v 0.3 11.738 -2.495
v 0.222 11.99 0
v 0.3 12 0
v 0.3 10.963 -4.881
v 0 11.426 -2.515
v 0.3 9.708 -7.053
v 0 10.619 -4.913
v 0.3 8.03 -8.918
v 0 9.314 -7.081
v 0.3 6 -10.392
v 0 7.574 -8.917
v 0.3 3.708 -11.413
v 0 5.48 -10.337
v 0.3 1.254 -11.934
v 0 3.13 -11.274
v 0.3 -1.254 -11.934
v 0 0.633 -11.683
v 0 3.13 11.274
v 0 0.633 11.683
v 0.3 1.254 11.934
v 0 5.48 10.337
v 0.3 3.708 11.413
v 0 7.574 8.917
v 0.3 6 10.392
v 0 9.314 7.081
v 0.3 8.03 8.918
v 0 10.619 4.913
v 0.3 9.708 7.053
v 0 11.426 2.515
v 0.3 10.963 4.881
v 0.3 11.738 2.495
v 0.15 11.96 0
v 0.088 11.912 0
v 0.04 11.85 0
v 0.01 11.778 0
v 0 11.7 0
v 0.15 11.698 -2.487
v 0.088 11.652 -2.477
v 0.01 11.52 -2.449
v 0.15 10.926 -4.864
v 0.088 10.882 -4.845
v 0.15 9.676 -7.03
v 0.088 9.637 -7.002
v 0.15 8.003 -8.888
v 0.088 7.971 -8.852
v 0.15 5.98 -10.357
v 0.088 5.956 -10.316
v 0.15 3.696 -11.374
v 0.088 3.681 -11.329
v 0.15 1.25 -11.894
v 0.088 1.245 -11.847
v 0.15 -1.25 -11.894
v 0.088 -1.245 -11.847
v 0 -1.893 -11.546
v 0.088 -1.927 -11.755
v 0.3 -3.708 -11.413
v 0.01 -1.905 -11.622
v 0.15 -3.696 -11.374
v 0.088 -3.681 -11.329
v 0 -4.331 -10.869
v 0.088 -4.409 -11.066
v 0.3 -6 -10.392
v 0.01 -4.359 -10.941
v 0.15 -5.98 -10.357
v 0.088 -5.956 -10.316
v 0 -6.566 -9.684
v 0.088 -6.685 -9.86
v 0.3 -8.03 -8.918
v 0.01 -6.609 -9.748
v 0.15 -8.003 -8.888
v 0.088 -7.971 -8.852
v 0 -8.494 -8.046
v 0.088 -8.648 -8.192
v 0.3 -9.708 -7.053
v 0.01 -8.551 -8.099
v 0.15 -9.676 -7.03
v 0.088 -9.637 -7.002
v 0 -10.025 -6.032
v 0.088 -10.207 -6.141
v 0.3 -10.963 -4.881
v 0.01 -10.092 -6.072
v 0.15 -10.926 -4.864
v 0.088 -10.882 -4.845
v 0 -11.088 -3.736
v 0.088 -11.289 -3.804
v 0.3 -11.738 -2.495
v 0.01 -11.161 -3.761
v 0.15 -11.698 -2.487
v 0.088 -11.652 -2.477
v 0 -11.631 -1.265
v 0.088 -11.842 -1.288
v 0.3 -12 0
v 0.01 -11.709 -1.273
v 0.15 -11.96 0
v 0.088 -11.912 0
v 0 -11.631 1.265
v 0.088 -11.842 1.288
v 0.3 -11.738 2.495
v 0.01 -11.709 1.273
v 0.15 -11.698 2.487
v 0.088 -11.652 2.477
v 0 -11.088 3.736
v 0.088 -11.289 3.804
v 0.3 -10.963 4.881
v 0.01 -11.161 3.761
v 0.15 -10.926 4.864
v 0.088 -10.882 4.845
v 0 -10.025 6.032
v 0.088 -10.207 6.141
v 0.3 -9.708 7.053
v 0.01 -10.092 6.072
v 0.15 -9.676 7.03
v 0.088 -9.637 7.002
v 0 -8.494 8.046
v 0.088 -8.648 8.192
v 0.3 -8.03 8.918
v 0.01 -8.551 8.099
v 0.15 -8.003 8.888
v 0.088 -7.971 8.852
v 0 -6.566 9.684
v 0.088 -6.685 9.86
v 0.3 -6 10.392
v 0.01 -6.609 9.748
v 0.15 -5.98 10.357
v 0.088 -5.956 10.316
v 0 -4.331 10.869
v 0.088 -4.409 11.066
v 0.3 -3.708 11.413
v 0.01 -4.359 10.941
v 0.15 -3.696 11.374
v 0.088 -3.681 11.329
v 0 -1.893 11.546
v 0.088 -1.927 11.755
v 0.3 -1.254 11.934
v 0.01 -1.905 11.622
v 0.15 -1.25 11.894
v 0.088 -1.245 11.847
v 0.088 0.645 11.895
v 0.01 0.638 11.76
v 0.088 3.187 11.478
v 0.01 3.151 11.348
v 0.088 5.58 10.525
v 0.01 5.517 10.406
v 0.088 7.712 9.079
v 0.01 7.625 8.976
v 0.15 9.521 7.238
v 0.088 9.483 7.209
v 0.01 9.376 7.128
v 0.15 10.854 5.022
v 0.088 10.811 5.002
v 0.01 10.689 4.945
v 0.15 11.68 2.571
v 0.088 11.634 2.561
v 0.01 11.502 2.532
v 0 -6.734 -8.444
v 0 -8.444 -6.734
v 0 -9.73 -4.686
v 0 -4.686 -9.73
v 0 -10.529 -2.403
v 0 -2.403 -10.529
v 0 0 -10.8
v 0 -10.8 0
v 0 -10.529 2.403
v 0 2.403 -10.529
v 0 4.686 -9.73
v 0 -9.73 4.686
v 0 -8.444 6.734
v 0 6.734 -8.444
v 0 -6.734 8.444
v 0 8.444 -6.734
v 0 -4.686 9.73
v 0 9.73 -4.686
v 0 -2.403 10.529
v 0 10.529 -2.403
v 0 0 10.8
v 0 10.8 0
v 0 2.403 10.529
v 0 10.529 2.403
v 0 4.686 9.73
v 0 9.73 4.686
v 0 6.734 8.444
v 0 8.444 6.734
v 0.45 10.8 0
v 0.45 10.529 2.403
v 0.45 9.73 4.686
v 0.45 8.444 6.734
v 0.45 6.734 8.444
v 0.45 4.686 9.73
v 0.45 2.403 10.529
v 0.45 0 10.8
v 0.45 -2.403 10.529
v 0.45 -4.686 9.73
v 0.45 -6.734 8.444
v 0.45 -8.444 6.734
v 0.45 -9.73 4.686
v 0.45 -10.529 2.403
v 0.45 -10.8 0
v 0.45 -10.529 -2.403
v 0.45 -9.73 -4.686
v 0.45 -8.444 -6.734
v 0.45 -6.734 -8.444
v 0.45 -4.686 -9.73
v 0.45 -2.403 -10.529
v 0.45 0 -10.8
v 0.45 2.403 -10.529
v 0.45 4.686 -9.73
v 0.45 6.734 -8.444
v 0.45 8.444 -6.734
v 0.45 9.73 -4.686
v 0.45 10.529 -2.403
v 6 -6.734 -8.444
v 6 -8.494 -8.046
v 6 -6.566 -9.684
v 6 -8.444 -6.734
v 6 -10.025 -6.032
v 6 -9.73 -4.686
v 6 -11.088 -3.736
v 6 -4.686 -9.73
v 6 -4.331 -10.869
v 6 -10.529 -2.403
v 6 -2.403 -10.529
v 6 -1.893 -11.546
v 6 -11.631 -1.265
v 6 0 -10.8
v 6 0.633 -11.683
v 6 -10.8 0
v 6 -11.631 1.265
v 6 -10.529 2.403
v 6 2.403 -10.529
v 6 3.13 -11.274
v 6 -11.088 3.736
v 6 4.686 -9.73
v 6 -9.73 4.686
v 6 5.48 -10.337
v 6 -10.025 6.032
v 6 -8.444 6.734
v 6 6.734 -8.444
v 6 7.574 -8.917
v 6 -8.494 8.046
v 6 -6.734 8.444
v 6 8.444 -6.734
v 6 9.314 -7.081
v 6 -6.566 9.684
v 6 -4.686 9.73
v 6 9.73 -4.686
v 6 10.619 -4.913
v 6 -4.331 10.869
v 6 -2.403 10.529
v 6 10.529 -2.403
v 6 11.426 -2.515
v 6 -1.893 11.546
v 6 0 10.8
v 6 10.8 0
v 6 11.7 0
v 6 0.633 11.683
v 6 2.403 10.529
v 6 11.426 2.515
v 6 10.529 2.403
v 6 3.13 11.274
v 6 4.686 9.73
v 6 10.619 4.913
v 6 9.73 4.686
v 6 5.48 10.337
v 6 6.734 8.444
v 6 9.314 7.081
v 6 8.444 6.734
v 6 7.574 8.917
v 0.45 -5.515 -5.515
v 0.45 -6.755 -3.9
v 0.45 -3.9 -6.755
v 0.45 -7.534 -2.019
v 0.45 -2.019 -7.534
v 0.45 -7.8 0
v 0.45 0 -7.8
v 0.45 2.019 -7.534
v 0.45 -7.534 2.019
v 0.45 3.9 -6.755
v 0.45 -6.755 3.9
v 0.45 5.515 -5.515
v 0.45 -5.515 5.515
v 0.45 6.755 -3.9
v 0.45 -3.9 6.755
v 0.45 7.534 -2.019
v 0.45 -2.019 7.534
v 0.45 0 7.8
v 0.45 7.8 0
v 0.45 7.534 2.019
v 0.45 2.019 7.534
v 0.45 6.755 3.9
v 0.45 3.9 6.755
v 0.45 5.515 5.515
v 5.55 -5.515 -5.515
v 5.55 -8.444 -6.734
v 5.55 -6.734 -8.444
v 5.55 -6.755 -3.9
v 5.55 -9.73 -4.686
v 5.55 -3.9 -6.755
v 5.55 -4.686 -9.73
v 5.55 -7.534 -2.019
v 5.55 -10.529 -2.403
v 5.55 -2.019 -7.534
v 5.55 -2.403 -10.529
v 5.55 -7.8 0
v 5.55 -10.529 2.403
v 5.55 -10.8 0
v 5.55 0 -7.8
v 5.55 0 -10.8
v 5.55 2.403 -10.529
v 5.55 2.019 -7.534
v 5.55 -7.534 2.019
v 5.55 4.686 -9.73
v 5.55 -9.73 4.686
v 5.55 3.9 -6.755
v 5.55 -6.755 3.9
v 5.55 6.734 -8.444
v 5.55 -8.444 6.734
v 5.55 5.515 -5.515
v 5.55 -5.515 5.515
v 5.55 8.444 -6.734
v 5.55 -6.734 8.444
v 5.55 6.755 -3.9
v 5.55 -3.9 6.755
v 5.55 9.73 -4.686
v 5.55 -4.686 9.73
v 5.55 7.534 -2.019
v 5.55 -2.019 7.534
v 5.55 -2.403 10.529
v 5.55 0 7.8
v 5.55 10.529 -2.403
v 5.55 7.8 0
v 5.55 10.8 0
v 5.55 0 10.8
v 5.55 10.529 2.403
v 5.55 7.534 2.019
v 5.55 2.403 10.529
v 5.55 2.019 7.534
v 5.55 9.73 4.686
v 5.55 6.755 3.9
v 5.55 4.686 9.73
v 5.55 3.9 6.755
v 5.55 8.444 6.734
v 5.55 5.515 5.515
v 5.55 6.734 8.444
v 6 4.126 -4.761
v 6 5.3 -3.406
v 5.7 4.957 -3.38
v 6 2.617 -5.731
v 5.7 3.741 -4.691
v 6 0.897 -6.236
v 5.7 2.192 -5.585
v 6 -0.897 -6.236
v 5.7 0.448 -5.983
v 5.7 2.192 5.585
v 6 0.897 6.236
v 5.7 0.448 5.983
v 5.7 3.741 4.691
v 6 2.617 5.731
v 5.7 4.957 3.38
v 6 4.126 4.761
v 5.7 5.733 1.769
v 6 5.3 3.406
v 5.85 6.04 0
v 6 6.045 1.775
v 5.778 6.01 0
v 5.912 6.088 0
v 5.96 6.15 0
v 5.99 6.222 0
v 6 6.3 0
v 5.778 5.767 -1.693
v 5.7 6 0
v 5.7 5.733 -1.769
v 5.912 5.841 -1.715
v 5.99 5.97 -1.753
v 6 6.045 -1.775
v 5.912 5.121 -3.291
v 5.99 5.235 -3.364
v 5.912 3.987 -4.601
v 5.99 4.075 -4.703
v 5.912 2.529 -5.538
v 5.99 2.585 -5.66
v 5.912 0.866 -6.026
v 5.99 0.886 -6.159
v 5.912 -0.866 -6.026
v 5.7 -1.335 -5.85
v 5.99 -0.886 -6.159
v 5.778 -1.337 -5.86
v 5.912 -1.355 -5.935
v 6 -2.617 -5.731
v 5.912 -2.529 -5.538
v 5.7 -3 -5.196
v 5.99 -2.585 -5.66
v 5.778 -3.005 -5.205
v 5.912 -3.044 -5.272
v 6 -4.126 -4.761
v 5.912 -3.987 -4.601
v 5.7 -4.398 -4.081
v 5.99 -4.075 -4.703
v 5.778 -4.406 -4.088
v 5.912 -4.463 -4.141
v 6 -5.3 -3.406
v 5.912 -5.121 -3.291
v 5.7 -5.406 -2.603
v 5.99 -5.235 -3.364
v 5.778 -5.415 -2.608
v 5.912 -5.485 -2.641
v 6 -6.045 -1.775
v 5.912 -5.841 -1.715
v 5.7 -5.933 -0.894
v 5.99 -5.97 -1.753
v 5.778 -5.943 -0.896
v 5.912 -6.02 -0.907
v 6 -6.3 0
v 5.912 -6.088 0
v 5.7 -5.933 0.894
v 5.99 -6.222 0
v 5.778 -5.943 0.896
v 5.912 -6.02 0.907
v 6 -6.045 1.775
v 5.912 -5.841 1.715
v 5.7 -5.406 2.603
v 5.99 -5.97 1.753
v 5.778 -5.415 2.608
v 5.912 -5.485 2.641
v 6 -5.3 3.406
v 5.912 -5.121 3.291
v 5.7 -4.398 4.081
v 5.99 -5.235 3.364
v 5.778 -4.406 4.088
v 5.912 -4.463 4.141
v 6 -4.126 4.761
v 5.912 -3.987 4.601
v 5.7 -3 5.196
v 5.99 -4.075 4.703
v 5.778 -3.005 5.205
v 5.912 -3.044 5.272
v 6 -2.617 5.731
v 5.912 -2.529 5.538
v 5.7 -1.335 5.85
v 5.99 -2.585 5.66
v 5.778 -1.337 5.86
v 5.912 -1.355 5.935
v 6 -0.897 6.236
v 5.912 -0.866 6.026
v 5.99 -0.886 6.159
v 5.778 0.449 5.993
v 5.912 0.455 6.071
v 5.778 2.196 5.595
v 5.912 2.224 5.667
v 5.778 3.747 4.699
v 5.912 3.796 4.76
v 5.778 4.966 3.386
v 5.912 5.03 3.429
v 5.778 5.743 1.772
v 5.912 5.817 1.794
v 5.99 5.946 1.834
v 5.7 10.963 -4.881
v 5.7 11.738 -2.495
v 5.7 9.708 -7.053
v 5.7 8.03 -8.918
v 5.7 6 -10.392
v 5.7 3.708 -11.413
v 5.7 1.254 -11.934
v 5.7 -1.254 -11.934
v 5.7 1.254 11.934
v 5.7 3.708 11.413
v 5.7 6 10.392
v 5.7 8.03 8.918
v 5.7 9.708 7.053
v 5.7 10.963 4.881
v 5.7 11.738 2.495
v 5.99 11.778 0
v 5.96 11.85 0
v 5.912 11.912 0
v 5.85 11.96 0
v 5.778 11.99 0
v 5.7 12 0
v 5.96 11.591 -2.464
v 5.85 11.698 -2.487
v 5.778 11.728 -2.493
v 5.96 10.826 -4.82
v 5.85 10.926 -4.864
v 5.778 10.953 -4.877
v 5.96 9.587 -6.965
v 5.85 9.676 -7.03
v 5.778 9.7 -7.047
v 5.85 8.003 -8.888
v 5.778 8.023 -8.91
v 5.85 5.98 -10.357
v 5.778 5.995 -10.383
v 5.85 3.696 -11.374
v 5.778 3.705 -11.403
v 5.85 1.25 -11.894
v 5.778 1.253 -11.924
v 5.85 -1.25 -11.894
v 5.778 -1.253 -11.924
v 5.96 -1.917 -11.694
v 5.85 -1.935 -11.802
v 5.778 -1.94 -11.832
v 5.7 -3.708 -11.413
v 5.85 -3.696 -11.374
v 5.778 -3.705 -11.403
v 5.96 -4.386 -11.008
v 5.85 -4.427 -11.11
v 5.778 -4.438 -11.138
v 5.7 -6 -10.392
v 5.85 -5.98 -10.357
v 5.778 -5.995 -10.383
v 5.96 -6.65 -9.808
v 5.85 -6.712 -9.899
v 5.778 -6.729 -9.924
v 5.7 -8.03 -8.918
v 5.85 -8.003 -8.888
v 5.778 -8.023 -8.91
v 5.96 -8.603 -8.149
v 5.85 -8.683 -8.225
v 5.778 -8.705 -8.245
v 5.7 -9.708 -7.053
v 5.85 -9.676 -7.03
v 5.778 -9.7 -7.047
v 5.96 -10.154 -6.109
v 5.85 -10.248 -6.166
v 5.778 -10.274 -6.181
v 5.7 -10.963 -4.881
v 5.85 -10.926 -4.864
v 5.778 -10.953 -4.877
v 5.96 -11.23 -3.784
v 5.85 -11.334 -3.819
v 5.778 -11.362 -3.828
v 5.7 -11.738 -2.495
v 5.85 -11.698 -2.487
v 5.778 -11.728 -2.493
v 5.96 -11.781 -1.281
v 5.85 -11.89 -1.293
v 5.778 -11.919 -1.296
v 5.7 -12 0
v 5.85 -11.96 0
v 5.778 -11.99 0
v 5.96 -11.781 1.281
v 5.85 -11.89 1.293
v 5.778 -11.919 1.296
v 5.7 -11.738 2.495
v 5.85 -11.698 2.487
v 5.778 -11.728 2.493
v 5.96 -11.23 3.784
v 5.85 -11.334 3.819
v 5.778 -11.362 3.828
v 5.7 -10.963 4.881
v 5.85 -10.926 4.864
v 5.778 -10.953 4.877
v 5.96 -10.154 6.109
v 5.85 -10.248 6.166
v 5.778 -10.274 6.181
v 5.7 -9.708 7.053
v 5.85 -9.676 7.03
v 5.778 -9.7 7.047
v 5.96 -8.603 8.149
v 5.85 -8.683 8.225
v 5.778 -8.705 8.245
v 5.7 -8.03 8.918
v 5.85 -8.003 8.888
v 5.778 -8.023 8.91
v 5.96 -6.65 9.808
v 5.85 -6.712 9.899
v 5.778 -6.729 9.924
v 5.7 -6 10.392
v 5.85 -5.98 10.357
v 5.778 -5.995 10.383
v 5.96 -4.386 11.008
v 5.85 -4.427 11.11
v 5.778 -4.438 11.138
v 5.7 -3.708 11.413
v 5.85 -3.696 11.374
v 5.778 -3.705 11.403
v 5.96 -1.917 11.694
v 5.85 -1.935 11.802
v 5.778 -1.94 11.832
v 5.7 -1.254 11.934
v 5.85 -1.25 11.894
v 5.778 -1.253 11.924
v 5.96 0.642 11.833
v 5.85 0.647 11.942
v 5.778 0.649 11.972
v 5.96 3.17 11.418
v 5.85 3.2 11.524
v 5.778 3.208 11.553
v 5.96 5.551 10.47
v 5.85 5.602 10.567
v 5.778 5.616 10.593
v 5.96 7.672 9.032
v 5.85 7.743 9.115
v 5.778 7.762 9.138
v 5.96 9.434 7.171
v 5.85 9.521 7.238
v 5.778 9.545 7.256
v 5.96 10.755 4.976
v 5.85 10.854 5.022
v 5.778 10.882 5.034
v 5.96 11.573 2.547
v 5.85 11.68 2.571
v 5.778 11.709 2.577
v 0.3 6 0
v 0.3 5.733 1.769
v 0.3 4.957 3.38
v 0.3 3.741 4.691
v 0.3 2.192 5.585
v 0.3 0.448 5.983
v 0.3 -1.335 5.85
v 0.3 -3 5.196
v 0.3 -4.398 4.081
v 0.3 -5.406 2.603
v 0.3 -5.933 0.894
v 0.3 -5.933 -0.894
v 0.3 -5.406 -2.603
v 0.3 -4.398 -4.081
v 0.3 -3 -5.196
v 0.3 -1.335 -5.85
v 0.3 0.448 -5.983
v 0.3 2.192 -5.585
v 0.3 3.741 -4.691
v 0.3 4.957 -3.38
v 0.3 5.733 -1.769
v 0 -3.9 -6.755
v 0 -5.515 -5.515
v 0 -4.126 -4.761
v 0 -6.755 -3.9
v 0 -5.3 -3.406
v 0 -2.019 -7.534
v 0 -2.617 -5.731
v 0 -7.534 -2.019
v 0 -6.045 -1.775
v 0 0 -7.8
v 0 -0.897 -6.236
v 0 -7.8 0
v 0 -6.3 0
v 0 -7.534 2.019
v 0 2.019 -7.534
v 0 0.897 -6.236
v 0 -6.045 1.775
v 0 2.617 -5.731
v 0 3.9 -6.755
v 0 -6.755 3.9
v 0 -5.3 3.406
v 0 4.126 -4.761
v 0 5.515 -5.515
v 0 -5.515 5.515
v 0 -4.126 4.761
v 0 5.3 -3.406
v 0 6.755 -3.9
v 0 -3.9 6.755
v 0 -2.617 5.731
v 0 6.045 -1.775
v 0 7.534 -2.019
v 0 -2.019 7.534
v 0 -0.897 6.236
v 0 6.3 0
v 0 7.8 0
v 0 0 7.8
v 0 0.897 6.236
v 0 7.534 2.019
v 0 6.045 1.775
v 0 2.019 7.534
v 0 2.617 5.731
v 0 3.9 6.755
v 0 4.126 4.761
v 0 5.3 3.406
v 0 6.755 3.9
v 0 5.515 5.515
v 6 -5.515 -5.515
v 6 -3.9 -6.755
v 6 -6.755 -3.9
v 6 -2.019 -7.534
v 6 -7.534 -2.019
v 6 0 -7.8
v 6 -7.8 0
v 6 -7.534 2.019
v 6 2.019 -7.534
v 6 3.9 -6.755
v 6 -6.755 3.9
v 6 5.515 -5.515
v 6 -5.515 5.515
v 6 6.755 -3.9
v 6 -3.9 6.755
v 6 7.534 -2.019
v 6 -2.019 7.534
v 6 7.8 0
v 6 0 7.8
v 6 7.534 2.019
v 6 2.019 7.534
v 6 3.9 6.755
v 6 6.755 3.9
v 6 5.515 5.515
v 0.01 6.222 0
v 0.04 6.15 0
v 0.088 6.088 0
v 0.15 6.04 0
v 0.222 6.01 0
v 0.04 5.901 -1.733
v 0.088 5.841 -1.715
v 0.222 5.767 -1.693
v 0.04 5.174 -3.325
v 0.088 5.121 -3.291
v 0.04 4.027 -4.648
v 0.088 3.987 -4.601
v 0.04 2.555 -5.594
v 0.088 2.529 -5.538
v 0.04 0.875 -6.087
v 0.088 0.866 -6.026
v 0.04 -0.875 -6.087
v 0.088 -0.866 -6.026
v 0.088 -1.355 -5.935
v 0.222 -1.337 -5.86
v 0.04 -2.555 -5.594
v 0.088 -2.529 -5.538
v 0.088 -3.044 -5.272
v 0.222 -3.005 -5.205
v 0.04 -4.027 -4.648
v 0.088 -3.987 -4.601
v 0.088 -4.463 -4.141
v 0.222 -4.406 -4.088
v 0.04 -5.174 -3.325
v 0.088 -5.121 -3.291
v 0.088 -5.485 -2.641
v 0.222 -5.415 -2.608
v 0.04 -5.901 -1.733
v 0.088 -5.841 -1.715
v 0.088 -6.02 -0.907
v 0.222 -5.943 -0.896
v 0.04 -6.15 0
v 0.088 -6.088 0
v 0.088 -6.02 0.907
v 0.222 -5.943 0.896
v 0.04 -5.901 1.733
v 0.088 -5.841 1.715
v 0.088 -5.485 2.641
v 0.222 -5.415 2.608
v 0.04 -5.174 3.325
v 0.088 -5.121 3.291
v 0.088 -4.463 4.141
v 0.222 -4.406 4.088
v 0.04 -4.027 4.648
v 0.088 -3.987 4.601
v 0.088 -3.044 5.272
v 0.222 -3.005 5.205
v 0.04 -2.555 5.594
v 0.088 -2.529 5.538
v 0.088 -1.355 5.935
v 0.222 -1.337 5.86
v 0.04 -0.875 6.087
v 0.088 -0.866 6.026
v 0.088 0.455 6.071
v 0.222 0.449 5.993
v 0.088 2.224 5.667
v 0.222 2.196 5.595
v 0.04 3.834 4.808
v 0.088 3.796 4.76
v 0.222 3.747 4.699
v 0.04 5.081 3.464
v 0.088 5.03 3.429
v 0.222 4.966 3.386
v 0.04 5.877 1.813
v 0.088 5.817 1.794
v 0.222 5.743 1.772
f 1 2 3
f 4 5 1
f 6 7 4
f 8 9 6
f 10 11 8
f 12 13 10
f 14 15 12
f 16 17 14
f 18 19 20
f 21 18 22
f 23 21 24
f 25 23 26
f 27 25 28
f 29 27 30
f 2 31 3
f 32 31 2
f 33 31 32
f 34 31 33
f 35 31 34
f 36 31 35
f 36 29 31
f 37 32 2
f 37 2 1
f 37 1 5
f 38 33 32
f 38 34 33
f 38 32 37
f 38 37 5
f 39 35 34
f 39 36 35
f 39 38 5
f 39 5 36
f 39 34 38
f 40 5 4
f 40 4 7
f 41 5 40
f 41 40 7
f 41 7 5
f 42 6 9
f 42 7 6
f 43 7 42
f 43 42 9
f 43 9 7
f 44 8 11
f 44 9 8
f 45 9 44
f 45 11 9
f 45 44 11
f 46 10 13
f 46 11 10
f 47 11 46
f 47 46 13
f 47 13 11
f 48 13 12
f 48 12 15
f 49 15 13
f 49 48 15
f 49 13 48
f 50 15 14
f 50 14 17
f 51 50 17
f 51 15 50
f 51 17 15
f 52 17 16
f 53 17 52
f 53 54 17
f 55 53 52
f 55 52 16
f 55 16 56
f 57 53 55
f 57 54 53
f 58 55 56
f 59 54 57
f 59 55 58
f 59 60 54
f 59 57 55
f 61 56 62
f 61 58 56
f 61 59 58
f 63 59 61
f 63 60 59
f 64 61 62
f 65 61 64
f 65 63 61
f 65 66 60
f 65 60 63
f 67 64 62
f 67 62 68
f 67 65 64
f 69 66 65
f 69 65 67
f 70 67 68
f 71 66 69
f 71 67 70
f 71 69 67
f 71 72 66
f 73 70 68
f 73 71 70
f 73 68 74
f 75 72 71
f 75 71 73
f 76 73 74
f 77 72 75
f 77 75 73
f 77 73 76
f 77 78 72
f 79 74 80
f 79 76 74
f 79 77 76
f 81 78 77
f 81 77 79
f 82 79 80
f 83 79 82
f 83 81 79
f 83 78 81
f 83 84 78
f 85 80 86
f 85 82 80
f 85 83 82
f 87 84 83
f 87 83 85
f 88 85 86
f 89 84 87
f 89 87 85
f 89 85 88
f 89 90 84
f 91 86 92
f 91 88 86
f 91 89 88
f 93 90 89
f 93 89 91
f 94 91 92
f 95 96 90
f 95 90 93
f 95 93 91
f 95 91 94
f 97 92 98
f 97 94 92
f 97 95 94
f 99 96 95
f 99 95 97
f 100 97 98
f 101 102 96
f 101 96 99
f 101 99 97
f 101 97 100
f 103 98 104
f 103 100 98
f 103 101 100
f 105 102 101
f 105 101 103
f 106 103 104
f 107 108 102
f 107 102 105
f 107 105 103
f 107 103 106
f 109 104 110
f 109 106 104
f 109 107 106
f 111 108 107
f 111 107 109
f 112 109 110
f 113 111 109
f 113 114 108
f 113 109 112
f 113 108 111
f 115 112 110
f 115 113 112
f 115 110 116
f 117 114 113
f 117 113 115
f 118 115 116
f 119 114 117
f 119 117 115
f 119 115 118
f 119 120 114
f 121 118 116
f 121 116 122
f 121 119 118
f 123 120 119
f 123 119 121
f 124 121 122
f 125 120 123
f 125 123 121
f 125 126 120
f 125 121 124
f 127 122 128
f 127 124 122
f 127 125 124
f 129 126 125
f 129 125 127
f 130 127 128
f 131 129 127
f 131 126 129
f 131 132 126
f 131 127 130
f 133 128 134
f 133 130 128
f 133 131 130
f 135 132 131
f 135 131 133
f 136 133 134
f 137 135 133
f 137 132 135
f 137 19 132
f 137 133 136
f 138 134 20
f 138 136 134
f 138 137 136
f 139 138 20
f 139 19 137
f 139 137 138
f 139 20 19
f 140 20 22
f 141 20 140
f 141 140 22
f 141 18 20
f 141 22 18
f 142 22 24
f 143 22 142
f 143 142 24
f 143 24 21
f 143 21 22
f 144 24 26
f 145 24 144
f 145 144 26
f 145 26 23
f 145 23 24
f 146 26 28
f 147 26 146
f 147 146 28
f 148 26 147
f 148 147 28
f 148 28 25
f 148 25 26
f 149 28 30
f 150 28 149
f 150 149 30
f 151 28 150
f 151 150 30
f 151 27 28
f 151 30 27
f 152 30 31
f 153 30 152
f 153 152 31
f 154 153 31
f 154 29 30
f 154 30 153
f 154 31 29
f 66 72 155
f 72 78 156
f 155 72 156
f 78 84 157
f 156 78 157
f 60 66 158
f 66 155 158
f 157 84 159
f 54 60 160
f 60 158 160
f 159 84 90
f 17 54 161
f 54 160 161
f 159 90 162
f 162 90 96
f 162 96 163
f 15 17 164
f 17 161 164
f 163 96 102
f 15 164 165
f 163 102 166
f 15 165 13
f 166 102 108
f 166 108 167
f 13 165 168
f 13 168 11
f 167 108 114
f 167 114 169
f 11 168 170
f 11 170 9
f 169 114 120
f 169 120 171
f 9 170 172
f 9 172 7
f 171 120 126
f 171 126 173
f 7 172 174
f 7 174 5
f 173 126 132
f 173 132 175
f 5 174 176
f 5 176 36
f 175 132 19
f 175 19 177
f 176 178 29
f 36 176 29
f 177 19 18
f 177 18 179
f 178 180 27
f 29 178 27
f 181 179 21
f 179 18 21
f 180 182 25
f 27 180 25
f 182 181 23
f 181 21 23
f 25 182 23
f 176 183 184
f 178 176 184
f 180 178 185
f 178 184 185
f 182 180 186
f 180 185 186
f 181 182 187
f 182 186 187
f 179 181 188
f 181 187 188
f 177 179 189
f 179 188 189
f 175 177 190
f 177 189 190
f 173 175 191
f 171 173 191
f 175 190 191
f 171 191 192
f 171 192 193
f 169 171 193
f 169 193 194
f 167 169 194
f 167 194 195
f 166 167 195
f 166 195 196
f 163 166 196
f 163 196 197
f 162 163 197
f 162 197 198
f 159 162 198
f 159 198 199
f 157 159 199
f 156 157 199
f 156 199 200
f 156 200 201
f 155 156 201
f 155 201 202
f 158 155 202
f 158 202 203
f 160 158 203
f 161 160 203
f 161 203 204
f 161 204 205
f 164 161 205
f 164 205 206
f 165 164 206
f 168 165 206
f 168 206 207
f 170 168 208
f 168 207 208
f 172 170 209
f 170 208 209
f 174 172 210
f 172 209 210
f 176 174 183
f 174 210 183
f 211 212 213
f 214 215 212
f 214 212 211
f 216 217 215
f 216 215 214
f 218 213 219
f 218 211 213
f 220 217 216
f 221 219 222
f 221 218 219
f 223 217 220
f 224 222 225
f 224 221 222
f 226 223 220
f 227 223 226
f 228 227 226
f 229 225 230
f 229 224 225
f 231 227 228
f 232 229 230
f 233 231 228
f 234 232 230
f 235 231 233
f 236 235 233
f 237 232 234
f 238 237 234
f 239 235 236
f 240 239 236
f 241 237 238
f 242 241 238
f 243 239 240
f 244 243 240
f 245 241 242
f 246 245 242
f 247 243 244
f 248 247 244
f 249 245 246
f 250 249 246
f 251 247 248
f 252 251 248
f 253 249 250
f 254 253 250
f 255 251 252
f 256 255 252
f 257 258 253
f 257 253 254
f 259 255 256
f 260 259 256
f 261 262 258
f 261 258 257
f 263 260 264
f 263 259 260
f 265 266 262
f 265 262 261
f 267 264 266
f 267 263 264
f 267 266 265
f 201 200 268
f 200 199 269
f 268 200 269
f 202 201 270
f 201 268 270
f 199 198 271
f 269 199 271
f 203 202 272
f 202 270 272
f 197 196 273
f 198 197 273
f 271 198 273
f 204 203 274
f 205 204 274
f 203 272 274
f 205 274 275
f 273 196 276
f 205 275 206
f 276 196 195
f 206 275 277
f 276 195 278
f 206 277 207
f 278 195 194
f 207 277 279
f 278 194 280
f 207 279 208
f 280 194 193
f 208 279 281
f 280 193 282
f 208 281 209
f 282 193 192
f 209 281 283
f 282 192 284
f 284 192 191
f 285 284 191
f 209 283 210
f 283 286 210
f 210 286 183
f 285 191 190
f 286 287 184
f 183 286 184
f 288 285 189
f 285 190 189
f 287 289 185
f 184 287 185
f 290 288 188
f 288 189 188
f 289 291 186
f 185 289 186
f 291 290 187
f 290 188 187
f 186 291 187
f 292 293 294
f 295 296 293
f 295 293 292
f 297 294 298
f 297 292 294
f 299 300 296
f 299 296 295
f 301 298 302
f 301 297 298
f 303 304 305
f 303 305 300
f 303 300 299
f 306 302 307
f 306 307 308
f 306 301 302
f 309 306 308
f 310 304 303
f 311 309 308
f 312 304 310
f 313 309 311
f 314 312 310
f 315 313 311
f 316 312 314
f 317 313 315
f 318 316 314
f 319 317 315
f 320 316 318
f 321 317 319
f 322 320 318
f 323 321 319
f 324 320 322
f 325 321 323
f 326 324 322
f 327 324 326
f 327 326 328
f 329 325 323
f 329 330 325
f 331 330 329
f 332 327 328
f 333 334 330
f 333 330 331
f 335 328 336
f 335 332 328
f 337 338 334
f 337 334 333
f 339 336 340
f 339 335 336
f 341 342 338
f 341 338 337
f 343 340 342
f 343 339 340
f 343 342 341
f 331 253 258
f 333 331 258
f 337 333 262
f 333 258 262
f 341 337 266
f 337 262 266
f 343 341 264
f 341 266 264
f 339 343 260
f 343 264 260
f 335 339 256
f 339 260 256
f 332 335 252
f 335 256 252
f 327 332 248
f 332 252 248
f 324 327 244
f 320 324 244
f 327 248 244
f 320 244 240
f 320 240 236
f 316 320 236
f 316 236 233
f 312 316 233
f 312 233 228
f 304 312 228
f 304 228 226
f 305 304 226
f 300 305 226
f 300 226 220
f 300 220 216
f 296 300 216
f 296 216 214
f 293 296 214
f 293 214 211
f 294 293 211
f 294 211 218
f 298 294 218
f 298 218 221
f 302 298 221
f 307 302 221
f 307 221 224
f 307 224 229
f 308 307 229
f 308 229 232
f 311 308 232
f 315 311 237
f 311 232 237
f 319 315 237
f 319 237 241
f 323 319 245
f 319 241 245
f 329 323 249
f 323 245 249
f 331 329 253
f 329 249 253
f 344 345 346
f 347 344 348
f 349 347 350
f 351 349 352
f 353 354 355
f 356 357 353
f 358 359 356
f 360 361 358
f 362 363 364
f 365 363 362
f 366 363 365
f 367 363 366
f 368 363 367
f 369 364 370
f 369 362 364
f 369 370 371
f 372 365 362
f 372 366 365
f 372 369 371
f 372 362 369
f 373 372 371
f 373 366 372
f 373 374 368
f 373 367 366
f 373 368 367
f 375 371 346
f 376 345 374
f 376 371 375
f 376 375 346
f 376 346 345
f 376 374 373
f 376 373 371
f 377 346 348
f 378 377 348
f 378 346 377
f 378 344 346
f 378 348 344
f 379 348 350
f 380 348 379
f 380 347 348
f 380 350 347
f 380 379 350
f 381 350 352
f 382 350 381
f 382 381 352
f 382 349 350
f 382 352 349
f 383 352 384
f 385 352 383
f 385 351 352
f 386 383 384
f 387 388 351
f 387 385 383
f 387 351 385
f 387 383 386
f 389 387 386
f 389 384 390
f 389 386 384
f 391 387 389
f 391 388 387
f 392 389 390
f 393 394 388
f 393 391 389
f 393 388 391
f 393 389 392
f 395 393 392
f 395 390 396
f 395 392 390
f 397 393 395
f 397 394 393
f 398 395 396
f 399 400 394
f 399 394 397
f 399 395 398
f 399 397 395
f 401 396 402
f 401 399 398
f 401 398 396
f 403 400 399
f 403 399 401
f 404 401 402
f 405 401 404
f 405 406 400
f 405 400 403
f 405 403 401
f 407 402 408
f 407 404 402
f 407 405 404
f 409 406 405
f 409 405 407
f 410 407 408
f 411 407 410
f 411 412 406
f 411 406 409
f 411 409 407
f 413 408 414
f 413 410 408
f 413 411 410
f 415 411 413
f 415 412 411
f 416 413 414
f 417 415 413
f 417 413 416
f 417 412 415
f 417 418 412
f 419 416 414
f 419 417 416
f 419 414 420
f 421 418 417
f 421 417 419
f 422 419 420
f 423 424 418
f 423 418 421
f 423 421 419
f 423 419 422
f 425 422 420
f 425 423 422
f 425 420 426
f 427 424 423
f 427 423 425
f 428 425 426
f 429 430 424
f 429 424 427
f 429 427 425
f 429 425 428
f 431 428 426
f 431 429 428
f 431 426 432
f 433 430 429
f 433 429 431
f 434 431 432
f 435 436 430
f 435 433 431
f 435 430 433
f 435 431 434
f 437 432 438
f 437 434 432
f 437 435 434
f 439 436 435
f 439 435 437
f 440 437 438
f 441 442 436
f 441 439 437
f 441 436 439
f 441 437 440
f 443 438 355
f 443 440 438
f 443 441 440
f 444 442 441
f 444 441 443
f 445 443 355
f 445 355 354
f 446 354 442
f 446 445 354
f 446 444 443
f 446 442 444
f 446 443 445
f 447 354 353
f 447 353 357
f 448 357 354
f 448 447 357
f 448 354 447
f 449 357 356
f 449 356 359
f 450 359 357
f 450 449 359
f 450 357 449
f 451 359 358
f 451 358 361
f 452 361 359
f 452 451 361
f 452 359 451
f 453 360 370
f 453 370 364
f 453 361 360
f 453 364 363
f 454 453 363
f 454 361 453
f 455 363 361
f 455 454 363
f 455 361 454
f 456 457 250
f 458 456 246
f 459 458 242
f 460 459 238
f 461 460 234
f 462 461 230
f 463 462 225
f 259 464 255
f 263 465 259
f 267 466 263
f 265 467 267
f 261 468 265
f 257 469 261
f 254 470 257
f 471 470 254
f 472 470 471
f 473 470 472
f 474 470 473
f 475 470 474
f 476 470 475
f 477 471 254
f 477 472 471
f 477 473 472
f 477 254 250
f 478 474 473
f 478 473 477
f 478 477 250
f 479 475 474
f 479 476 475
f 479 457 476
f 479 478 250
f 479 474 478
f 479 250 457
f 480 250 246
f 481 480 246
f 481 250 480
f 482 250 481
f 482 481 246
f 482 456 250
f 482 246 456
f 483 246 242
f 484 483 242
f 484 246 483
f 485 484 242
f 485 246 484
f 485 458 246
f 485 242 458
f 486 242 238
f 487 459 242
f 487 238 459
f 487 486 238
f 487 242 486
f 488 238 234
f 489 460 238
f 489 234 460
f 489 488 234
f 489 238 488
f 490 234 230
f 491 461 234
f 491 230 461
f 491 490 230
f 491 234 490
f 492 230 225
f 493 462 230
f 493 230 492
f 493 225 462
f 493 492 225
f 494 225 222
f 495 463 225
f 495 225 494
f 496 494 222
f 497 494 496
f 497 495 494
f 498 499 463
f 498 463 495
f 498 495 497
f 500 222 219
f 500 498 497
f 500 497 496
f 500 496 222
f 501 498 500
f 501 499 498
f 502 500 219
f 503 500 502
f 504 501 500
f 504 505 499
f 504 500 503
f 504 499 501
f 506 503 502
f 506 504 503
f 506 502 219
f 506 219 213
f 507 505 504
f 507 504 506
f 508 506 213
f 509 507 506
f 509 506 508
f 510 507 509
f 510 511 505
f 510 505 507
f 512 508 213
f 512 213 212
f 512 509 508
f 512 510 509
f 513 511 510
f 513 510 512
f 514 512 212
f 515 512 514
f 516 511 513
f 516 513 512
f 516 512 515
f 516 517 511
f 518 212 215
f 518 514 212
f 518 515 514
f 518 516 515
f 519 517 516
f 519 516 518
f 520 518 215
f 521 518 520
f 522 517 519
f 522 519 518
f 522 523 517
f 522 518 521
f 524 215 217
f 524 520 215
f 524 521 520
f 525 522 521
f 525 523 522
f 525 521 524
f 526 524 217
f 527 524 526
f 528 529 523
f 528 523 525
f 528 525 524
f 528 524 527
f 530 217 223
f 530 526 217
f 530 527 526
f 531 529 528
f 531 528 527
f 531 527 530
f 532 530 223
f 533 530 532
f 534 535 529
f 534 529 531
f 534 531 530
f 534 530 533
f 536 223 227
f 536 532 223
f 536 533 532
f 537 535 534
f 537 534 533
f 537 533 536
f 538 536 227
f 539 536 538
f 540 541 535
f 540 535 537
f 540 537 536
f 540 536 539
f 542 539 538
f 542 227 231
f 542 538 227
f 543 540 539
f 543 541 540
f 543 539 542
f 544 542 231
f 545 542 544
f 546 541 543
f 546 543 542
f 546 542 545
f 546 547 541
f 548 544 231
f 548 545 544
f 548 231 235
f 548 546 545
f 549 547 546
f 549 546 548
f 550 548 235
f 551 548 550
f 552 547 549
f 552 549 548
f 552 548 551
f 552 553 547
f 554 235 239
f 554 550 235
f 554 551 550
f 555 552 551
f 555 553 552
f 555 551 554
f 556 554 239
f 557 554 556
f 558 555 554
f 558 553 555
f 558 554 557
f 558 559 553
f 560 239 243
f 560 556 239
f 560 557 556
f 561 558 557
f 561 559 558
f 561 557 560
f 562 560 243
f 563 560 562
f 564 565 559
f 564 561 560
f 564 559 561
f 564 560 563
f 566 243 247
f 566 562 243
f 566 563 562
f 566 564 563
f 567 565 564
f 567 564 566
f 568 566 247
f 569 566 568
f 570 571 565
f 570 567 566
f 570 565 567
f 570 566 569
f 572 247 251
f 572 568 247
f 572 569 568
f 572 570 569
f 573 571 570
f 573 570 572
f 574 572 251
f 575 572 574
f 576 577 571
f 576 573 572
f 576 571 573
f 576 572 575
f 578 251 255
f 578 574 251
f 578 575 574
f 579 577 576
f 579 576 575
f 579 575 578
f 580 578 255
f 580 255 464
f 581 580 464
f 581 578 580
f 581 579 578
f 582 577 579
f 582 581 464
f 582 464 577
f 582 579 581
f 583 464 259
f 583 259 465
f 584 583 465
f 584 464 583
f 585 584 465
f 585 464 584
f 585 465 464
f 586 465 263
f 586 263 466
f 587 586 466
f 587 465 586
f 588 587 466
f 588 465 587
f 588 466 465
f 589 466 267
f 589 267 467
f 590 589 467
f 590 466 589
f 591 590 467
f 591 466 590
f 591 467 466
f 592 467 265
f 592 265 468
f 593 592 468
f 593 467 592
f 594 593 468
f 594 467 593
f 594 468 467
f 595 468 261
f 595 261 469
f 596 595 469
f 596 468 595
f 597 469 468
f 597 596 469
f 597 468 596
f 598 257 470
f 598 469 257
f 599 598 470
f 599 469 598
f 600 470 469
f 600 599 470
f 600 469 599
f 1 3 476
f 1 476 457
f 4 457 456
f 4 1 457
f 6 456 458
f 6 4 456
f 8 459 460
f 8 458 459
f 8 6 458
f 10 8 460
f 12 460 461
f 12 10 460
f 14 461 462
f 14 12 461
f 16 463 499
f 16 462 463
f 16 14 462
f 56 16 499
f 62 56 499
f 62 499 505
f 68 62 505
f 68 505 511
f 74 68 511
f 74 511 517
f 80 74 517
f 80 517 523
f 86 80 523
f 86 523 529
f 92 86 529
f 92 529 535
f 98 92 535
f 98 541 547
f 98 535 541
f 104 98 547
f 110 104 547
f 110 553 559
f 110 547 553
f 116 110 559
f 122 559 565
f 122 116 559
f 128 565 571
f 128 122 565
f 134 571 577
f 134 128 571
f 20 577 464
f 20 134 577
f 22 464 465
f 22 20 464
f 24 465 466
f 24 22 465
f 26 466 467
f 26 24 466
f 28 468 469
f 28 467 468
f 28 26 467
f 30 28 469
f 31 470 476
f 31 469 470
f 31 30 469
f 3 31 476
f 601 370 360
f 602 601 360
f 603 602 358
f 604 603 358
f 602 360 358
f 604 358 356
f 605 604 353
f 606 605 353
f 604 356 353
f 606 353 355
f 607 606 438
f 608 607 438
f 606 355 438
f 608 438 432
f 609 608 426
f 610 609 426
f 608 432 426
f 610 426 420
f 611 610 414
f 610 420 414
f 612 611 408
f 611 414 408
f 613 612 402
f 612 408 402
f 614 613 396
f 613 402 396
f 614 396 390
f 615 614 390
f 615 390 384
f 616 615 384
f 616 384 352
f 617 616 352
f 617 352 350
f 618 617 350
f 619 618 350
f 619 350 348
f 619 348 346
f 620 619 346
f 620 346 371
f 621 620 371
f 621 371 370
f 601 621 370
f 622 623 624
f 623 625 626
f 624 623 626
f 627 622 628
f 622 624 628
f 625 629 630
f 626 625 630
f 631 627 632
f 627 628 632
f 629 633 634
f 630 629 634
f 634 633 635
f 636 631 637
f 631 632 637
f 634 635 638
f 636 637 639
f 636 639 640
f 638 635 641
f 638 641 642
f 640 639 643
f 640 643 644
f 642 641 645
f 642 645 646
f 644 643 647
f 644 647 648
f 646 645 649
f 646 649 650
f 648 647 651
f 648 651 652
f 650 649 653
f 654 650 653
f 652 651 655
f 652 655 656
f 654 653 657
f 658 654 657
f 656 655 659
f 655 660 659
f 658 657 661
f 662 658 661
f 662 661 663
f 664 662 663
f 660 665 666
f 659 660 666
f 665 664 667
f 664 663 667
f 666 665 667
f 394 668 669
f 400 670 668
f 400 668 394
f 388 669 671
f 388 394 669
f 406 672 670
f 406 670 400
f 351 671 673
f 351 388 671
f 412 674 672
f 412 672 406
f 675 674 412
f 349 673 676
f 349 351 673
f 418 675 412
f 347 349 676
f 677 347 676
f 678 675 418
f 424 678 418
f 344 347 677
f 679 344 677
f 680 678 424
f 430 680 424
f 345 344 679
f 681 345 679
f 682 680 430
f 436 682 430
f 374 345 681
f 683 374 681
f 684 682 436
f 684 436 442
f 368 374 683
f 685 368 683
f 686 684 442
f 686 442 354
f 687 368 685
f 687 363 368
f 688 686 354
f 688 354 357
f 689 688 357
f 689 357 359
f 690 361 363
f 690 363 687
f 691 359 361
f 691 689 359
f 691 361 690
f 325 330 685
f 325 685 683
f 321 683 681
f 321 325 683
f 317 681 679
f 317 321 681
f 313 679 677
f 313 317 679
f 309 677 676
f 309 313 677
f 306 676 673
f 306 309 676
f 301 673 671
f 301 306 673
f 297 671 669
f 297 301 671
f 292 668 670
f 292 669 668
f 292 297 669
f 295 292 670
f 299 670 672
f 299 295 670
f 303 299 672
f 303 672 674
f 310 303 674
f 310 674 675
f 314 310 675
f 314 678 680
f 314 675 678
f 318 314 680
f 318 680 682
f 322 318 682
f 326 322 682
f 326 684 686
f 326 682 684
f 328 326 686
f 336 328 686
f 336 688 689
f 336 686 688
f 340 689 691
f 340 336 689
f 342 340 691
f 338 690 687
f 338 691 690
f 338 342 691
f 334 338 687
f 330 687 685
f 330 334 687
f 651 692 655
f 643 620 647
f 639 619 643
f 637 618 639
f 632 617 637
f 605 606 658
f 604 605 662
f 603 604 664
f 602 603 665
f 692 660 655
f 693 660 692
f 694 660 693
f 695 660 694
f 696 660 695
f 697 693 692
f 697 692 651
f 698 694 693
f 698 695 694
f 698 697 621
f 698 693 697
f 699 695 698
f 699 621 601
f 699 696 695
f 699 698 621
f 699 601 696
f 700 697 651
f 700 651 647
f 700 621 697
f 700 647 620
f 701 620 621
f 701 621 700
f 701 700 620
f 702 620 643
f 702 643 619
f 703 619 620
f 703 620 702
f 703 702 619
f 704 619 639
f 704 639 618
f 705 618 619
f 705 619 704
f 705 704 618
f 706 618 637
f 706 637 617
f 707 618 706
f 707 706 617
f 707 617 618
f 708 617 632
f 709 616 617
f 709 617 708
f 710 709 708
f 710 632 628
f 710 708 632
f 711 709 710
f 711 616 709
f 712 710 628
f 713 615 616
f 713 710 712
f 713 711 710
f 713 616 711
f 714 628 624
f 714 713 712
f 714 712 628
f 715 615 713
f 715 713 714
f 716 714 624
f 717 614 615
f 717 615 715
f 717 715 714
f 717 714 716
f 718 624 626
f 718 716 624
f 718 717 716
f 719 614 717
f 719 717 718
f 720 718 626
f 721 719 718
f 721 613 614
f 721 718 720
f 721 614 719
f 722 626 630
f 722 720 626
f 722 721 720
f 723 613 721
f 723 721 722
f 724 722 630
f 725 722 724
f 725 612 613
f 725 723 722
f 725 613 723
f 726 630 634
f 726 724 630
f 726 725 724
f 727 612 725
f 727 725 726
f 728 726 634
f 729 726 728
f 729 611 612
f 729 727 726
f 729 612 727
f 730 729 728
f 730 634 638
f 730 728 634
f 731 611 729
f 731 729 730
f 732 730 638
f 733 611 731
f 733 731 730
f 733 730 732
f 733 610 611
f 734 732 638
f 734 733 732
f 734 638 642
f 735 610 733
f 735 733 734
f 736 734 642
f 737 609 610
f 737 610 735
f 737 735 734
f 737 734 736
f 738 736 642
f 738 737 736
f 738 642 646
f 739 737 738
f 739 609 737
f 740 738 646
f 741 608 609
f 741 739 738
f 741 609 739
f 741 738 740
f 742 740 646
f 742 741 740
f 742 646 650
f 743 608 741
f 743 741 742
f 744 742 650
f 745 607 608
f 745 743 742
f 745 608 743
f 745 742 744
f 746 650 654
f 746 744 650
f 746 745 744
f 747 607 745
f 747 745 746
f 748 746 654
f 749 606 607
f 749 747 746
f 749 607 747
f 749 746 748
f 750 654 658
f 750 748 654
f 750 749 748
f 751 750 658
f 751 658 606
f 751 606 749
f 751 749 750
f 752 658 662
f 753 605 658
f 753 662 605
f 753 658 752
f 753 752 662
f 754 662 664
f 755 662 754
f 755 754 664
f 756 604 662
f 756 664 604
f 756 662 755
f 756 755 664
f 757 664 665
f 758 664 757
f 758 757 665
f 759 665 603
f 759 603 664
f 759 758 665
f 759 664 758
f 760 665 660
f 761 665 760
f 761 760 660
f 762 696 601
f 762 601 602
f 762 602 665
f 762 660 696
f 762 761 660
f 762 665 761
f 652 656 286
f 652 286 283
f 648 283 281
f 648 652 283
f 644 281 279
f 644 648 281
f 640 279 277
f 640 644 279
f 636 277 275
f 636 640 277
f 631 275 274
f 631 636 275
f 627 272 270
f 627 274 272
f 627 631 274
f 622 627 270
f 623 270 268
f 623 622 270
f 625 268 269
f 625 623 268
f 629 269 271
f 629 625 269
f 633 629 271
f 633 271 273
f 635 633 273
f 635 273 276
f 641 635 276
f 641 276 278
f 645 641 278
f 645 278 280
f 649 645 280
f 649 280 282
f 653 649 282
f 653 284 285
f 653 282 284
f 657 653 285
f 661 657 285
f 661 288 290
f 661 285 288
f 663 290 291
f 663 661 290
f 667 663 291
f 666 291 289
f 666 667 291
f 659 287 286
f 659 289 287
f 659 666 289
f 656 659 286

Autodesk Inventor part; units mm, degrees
sketch "Sketch_1" plane through (0, 0, 0) normal (0, 0, 1) x (1, 0, 0)
  line L0 (6, 0) -> (0, 0)
  arc A0 (0, 6.3) -> (0.3, 6) centre (0.3, 6.3) ccw
  line L1 (0.3, 6) -> (5.7, 6)
  arc A1 (5.7, 6) -> (6, 6.3) centre (5.7, 6.3) ccw
  line L2 (6, 6.3) -> (6, 7.8)
  line L3 (6, 7.8) -> (5.55, 7.8)
  line L4 (5.55, 7.8) -> (5.55, 10.8)
  line L5 (5.55, 10.8) -> (6, 10.8)
  line L6 (6, 10.8) -> (6, 11.7)
  arc A2 (6, 11.7) -> (5.7, 12) centre (5.7, 11.7) ccw
  line L7 (5.7, 12) -> (0.3, 12)
  arc A3 (0.3, 12) -> (0, 11.7) centre (0.3, 11.7) ccw
  line L8 (0, 11.7) -> (0, 10.8)
  line L9 (0, 10.8) -> (0.45, 10.8)
  line L10 (0.45, 10.8) -> (0.45, 7.8)
  line L11 (0.45, 7.8) -> (0, 7.8)
  line L12 (0, 7.8) -> (0, 6.3)
revolve "Revolution1" add sketch "Sketch_1" angle 360 about axis through (6, 0, 0) along (1, 0, 0)
ref_plane "center_point_XY" through (3, 0, 0) normal (1, 0, 0) x (0, 0, -1)
ref_plane "center_point_YZ" through (3, 0, 0) normal (0, 0, -1) x (0, 1, 0)
ref_plane "center_point_ZX" through (3, 0, 0) normal (0, 1, 0) x (1, 0, 0)
ref_plane "to_housing_XY" through (0, 0, 0) normal (1, 0, 0) x (0, 0, -1)
ref_plane "to_housing_YZ" through (0, 0, 0) normal (0, 0, -1) x (0, 1, 0)
ref_plane "to_housing_ZX" through (0, 0, 0) normal (0, 1, 0) x (1, 0, 0)
ref_plane "to_ring_XY" through (5.1, 0, 0) normal (1, 0, 0) x (0, 0, -1)
ref_plane "to_ring_YZ" through (5.1, 0, 0) normal (0, 0, -1) x (0, 1, 0)
ref_plane "to_ring_ZX" through (5.1, 0, 0) normal (0, 1, 0) x (1, 0, 0)
properties part number "B6901ZZ" material "鋼、炭素鋼"
